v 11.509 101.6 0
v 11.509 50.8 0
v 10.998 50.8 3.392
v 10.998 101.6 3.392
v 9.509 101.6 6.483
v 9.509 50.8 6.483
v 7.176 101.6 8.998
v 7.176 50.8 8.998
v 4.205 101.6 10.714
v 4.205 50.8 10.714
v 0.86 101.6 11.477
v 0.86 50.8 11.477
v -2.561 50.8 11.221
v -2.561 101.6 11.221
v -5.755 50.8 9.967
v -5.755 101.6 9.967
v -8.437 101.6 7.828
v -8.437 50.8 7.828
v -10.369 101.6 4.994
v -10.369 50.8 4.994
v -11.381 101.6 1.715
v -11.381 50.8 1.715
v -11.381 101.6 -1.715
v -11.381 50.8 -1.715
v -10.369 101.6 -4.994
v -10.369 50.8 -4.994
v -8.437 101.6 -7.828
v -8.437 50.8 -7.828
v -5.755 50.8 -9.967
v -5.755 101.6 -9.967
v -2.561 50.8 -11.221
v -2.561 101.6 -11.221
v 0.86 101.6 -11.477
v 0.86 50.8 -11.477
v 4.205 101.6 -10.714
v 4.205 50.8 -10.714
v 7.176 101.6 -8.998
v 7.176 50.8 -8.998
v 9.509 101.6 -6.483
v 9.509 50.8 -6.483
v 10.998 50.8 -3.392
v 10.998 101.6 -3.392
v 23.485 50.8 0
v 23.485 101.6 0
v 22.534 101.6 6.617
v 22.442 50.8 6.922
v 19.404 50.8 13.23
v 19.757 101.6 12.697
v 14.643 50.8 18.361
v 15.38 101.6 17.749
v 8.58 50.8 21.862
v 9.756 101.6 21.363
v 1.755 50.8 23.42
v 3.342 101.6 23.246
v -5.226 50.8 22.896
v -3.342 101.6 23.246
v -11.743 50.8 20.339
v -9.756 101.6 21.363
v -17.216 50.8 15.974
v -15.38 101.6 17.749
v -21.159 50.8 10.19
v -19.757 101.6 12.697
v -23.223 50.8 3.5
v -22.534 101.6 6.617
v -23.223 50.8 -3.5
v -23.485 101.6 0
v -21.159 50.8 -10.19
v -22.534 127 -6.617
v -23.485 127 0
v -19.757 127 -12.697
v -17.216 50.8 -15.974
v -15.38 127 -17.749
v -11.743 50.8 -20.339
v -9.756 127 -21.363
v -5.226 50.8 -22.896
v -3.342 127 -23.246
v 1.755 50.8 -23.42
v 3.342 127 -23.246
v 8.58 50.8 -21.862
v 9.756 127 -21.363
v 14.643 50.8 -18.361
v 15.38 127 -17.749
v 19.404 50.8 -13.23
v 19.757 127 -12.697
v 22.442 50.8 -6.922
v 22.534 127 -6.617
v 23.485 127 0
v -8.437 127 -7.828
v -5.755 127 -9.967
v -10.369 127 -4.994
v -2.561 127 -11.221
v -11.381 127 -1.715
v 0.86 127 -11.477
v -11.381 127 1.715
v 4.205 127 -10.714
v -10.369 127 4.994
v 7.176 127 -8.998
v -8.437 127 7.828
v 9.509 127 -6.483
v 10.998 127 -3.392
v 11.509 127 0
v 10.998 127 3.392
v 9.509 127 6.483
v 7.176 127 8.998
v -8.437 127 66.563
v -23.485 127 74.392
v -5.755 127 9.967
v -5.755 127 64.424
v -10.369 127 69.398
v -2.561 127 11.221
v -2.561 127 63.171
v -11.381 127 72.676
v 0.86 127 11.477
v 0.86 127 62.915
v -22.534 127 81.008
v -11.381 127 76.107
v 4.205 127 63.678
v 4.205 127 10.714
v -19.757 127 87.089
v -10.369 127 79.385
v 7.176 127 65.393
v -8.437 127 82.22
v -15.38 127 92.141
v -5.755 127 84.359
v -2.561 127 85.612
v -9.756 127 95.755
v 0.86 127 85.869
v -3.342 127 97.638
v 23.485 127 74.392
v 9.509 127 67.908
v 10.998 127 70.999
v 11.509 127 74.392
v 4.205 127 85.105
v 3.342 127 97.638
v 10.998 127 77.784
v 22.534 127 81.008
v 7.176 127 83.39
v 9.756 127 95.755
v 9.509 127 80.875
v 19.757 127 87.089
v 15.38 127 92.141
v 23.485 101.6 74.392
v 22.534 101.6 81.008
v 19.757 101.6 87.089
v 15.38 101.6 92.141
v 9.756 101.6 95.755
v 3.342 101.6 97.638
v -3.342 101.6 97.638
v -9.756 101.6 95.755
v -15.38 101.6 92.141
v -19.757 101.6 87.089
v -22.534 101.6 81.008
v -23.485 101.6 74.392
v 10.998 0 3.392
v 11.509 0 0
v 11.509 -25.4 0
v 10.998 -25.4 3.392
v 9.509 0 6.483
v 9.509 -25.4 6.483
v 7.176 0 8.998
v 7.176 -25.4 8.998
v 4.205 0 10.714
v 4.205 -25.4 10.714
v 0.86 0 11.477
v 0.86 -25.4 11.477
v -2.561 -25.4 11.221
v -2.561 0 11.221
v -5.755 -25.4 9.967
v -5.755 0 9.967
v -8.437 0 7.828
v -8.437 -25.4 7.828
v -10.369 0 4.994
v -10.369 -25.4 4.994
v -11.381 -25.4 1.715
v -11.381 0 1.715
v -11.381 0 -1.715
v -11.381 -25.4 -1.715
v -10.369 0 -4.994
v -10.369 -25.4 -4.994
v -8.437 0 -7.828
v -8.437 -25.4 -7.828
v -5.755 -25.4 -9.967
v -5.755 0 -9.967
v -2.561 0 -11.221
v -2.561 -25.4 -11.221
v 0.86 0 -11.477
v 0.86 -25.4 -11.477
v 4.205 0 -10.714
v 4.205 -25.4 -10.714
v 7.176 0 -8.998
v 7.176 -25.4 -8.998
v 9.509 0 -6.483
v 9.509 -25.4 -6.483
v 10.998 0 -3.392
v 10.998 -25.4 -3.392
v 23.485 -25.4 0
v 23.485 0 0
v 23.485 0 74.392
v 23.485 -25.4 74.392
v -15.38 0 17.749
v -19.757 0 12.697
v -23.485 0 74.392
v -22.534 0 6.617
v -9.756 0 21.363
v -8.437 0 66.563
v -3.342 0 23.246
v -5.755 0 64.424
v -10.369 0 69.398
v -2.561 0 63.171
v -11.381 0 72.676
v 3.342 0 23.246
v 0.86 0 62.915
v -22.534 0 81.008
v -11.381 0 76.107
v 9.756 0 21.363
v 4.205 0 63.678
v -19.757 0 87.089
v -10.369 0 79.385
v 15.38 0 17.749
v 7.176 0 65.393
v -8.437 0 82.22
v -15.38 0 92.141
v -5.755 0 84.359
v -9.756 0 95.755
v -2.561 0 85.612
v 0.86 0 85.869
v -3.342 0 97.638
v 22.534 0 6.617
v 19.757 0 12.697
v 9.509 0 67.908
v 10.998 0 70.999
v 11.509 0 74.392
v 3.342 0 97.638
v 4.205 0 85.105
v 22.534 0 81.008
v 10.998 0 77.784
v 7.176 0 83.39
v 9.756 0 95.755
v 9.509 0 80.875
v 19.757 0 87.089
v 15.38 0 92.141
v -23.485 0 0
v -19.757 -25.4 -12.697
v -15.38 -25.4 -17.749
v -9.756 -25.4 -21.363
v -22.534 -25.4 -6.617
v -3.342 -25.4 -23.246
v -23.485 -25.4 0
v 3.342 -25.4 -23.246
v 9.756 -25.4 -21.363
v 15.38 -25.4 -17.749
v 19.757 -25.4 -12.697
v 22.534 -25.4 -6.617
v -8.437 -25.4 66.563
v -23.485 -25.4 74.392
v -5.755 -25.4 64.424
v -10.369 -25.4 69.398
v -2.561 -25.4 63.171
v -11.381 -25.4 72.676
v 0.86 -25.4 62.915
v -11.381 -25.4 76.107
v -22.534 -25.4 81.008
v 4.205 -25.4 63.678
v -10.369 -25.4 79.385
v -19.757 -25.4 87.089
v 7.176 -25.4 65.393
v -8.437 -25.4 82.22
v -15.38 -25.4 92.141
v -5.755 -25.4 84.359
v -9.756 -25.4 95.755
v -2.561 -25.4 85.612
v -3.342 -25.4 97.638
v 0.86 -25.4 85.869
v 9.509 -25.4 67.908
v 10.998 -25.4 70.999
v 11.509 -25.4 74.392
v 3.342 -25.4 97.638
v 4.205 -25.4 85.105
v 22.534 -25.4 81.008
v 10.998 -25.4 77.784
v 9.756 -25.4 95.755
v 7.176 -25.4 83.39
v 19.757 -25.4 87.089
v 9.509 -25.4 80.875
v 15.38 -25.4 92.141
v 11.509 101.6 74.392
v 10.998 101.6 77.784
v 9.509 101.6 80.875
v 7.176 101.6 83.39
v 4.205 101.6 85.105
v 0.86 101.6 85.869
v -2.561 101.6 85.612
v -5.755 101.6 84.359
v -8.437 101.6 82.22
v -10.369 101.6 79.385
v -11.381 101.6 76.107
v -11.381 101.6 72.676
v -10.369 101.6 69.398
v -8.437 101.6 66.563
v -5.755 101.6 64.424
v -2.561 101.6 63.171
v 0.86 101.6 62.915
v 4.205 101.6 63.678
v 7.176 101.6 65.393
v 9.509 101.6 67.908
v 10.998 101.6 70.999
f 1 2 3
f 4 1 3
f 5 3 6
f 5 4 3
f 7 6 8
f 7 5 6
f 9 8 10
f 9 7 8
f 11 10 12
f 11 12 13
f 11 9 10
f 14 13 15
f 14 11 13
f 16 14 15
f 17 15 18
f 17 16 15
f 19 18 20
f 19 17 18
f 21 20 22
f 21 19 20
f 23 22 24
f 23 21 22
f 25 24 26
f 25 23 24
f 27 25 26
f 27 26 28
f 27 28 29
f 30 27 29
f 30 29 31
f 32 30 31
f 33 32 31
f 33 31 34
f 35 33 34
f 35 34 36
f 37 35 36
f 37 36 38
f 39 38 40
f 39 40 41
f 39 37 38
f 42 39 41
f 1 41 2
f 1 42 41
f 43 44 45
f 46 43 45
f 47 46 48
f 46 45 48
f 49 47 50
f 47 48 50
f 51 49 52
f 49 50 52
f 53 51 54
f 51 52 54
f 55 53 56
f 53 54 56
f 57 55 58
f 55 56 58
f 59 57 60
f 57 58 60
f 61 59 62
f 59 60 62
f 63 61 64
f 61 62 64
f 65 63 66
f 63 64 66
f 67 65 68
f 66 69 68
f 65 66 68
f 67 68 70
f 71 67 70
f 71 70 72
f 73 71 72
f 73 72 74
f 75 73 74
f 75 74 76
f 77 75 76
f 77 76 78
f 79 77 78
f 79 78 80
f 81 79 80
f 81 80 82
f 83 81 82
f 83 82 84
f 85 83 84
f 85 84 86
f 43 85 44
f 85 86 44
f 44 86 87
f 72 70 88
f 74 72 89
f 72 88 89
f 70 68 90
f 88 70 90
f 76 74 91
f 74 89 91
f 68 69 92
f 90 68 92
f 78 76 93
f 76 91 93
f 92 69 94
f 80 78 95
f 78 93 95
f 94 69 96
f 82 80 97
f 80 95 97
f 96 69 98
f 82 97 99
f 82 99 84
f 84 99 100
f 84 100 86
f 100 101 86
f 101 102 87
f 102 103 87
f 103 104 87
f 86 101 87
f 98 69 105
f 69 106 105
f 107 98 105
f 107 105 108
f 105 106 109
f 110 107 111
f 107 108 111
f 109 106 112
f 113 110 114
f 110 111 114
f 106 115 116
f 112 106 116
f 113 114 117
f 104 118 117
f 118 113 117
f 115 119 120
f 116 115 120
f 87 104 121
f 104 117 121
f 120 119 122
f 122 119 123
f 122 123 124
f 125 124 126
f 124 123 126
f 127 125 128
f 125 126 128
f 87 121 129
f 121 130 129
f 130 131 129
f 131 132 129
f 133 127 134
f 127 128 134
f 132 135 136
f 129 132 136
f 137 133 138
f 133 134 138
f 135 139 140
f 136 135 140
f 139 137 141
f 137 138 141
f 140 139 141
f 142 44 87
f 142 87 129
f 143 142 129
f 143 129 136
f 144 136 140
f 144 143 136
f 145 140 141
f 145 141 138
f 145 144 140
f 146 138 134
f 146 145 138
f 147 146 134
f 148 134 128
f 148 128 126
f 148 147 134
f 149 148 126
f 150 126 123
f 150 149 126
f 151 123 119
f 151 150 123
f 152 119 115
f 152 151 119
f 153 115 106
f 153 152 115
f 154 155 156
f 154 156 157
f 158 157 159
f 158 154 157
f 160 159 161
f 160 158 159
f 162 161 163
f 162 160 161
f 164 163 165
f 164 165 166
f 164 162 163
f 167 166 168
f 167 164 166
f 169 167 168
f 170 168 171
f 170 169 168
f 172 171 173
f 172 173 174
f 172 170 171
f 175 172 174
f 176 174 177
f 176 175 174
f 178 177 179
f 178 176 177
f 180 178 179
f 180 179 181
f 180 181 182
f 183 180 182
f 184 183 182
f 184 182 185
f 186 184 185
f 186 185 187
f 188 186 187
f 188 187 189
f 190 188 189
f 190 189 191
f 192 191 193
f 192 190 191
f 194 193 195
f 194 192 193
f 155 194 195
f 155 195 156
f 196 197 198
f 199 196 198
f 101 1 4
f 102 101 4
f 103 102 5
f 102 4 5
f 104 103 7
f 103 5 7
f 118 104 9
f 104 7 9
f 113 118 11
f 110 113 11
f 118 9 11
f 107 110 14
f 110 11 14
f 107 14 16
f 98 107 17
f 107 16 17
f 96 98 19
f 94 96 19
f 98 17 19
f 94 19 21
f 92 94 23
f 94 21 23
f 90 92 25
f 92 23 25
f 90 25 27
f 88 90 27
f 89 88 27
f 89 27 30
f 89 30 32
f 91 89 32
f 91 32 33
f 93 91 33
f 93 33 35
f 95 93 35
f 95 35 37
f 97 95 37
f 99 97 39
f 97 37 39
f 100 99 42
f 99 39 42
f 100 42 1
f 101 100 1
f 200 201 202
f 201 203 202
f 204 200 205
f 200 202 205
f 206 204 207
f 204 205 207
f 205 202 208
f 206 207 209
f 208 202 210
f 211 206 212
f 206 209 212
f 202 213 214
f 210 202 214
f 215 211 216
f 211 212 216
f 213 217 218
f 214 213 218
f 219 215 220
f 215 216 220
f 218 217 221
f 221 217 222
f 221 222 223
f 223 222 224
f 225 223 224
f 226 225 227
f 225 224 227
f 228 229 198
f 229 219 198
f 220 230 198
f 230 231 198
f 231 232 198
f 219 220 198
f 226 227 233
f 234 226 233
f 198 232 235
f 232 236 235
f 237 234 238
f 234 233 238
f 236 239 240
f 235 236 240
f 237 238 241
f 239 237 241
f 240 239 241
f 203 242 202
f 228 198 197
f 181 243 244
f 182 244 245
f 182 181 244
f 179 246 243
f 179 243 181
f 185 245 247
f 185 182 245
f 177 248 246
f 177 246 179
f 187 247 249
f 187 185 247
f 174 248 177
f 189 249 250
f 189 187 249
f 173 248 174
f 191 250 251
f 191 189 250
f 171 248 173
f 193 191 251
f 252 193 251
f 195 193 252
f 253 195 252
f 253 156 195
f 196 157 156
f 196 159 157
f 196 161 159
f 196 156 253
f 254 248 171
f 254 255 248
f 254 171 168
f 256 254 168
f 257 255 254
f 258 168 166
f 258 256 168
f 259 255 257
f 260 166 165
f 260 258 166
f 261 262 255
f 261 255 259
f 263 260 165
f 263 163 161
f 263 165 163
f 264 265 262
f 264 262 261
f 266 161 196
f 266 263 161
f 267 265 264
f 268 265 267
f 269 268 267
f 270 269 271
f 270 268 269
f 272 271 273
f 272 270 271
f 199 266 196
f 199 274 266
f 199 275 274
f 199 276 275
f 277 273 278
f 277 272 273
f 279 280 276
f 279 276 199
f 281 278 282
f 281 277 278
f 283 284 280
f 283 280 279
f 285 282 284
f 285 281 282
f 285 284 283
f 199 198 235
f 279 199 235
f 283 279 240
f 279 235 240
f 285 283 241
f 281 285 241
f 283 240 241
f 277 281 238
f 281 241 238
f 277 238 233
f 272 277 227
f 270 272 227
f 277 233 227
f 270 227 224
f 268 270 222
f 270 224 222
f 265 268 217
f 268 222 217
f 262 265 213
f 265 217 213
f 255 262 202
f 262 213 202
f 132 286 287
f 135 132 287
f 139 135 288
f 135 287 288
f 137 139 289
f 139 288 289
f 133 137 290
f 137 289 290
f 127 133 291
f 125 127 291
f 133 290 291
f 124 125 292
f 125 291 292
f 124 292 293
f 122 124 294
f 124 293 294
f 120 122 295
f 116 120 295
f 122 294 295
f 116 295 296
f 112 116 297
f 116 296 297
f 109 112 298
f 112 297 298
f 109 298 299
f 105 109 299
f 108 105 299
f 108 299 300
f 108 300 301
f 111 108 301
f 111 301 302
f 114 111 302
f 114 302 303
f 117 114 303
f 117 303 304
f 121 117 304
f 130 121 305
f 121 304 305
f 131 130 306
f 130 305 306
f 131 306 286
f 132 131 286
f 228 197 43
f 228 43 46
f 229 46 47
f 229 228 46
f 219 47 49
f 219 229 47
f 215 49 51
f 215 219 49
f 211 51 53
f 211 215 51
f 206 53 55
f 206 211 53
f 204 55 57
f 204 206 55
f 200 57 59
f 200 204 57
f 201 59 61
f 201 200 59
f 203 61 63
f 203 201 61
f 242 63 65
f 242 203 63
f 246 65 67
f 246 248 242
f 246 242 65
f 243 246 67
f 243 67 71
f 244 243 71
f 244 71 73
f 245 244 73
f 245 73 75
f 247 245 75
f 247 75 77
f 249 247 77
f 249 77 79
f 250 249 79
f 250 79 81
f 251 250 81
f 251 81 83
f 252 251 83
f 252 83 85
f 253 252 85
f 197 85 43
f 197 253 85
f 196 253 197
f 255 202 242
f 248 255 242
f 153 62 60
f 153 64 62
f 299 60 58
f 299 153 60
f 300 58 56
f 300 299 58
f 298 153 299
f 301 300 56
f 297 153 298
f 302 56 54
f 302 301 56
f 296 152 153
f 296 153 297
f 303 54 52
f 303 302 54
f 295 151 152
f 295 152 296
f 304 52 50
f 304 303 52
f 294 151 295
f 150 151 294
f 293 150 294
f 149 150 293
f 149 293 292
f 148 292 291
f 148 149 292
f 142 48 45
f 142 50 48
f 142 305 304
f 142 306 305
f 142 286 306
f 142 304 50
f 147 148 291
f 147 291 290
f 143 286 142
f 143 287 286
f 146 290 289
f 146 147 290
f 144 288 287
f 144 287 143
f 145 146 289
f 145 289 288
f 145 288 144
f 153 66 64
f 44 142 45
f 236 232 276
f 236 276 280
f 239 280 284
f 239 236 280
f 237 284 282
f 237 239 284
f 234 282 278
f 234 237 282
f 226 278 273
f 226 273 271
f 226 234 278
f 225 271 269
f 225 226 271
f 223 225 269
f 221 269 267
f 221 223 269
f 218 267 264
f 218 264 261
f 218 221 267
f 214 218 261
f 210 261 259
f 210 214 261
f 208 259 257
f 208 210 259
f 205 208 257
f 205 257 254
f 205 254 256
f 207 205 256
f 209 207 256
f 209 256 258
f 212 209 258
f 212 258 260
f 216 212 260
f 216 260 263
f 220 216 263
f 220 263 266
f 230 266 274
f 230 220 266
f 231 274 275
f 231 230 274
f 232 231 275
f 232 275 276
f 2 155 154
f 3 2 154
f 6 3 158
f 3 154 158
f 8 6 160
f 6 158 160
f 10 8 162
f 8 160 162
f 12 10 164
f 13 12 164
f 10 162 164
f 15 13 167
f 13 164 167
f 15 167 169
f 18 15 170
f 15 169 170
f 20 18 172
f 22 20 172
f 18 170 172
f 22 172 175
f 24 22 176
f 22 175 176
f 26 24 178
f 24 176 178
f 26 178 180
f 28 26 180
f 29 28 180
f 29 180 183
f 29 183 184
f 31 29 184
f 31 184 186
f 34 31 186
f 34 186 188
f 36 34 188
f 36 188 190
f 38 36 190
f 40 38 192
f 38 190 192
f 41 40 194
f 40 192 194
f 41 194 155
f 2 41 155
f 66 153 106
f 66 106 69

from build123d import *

# Parameters (mm, degrees)
F0_R     = 11.509137
F1_DEPTH = 25.4
F2_DEPTH = 50.8


with BuildPart() as f1:
    # F0 (on Front) → F1 (new body)
    with BuildSketch(Plane.XZ):
        with BuildLine():
            ThreePointArc((-23.485197, 0), (0, -23.485197), (23.485197, 0))
            ThreePointArc((23.485197, 0), (0, 23.485197), (-23.485197, 0))
        make_face()
        Circle(F0_R, mode=Mode.SUBTRACT)
        with BuildLine():
            ThreePointArc((-23.485197, 0), (0, 23.485197), (23.485197, 0))
            Line((23.485197, 0), (23.485197, 74.391678))
            ThreePointArc((23.485197, 74.391678), (0, 50.906481), (-23.485197, 74.391678))
            Line((-23.485197, 74.391678), (-23.485197, 0))
        make_face()
        with BuildLine():
            ThreePointArc((-23.485197, 74.391678), (0, 50.906481), (23.485197, 74.391678))
            ThreePointArc((23.485197, 74.391678), (0, 97.876875), (-23.485197, 74.391678))
        make_face()
        with Locations((0, 74.391678)):
            Circle(F0_R, mode=Mode.SUBTRACT)
    extrude(amount=F1_DEPTH)

    # F0 (on Front) → F2 (join)
    with BuildSketch(Plane.XZ):
        with BuildLine():
            ThreePointArc((-23.485197, 0), (0, -23.485197), (23.485197, 0))
            ThreePointArc((23.485197, 0), (0, 23.485197), (-23.485197, 0))
        make_face()
        Circle(F0_R, mode=Mode.SUBTRACT)
    extrude(amount=-F2_DEPTH)

    # F3: F1 across face


with BuildPart() as f1_1:
    add(f1.part)
    add(f1.part.mirror(Plane(origin=(0, 50.8, 0), x_dir=(1, 0, 0), z_dir=(0, 1, 0))))


solid = f1_1.part
